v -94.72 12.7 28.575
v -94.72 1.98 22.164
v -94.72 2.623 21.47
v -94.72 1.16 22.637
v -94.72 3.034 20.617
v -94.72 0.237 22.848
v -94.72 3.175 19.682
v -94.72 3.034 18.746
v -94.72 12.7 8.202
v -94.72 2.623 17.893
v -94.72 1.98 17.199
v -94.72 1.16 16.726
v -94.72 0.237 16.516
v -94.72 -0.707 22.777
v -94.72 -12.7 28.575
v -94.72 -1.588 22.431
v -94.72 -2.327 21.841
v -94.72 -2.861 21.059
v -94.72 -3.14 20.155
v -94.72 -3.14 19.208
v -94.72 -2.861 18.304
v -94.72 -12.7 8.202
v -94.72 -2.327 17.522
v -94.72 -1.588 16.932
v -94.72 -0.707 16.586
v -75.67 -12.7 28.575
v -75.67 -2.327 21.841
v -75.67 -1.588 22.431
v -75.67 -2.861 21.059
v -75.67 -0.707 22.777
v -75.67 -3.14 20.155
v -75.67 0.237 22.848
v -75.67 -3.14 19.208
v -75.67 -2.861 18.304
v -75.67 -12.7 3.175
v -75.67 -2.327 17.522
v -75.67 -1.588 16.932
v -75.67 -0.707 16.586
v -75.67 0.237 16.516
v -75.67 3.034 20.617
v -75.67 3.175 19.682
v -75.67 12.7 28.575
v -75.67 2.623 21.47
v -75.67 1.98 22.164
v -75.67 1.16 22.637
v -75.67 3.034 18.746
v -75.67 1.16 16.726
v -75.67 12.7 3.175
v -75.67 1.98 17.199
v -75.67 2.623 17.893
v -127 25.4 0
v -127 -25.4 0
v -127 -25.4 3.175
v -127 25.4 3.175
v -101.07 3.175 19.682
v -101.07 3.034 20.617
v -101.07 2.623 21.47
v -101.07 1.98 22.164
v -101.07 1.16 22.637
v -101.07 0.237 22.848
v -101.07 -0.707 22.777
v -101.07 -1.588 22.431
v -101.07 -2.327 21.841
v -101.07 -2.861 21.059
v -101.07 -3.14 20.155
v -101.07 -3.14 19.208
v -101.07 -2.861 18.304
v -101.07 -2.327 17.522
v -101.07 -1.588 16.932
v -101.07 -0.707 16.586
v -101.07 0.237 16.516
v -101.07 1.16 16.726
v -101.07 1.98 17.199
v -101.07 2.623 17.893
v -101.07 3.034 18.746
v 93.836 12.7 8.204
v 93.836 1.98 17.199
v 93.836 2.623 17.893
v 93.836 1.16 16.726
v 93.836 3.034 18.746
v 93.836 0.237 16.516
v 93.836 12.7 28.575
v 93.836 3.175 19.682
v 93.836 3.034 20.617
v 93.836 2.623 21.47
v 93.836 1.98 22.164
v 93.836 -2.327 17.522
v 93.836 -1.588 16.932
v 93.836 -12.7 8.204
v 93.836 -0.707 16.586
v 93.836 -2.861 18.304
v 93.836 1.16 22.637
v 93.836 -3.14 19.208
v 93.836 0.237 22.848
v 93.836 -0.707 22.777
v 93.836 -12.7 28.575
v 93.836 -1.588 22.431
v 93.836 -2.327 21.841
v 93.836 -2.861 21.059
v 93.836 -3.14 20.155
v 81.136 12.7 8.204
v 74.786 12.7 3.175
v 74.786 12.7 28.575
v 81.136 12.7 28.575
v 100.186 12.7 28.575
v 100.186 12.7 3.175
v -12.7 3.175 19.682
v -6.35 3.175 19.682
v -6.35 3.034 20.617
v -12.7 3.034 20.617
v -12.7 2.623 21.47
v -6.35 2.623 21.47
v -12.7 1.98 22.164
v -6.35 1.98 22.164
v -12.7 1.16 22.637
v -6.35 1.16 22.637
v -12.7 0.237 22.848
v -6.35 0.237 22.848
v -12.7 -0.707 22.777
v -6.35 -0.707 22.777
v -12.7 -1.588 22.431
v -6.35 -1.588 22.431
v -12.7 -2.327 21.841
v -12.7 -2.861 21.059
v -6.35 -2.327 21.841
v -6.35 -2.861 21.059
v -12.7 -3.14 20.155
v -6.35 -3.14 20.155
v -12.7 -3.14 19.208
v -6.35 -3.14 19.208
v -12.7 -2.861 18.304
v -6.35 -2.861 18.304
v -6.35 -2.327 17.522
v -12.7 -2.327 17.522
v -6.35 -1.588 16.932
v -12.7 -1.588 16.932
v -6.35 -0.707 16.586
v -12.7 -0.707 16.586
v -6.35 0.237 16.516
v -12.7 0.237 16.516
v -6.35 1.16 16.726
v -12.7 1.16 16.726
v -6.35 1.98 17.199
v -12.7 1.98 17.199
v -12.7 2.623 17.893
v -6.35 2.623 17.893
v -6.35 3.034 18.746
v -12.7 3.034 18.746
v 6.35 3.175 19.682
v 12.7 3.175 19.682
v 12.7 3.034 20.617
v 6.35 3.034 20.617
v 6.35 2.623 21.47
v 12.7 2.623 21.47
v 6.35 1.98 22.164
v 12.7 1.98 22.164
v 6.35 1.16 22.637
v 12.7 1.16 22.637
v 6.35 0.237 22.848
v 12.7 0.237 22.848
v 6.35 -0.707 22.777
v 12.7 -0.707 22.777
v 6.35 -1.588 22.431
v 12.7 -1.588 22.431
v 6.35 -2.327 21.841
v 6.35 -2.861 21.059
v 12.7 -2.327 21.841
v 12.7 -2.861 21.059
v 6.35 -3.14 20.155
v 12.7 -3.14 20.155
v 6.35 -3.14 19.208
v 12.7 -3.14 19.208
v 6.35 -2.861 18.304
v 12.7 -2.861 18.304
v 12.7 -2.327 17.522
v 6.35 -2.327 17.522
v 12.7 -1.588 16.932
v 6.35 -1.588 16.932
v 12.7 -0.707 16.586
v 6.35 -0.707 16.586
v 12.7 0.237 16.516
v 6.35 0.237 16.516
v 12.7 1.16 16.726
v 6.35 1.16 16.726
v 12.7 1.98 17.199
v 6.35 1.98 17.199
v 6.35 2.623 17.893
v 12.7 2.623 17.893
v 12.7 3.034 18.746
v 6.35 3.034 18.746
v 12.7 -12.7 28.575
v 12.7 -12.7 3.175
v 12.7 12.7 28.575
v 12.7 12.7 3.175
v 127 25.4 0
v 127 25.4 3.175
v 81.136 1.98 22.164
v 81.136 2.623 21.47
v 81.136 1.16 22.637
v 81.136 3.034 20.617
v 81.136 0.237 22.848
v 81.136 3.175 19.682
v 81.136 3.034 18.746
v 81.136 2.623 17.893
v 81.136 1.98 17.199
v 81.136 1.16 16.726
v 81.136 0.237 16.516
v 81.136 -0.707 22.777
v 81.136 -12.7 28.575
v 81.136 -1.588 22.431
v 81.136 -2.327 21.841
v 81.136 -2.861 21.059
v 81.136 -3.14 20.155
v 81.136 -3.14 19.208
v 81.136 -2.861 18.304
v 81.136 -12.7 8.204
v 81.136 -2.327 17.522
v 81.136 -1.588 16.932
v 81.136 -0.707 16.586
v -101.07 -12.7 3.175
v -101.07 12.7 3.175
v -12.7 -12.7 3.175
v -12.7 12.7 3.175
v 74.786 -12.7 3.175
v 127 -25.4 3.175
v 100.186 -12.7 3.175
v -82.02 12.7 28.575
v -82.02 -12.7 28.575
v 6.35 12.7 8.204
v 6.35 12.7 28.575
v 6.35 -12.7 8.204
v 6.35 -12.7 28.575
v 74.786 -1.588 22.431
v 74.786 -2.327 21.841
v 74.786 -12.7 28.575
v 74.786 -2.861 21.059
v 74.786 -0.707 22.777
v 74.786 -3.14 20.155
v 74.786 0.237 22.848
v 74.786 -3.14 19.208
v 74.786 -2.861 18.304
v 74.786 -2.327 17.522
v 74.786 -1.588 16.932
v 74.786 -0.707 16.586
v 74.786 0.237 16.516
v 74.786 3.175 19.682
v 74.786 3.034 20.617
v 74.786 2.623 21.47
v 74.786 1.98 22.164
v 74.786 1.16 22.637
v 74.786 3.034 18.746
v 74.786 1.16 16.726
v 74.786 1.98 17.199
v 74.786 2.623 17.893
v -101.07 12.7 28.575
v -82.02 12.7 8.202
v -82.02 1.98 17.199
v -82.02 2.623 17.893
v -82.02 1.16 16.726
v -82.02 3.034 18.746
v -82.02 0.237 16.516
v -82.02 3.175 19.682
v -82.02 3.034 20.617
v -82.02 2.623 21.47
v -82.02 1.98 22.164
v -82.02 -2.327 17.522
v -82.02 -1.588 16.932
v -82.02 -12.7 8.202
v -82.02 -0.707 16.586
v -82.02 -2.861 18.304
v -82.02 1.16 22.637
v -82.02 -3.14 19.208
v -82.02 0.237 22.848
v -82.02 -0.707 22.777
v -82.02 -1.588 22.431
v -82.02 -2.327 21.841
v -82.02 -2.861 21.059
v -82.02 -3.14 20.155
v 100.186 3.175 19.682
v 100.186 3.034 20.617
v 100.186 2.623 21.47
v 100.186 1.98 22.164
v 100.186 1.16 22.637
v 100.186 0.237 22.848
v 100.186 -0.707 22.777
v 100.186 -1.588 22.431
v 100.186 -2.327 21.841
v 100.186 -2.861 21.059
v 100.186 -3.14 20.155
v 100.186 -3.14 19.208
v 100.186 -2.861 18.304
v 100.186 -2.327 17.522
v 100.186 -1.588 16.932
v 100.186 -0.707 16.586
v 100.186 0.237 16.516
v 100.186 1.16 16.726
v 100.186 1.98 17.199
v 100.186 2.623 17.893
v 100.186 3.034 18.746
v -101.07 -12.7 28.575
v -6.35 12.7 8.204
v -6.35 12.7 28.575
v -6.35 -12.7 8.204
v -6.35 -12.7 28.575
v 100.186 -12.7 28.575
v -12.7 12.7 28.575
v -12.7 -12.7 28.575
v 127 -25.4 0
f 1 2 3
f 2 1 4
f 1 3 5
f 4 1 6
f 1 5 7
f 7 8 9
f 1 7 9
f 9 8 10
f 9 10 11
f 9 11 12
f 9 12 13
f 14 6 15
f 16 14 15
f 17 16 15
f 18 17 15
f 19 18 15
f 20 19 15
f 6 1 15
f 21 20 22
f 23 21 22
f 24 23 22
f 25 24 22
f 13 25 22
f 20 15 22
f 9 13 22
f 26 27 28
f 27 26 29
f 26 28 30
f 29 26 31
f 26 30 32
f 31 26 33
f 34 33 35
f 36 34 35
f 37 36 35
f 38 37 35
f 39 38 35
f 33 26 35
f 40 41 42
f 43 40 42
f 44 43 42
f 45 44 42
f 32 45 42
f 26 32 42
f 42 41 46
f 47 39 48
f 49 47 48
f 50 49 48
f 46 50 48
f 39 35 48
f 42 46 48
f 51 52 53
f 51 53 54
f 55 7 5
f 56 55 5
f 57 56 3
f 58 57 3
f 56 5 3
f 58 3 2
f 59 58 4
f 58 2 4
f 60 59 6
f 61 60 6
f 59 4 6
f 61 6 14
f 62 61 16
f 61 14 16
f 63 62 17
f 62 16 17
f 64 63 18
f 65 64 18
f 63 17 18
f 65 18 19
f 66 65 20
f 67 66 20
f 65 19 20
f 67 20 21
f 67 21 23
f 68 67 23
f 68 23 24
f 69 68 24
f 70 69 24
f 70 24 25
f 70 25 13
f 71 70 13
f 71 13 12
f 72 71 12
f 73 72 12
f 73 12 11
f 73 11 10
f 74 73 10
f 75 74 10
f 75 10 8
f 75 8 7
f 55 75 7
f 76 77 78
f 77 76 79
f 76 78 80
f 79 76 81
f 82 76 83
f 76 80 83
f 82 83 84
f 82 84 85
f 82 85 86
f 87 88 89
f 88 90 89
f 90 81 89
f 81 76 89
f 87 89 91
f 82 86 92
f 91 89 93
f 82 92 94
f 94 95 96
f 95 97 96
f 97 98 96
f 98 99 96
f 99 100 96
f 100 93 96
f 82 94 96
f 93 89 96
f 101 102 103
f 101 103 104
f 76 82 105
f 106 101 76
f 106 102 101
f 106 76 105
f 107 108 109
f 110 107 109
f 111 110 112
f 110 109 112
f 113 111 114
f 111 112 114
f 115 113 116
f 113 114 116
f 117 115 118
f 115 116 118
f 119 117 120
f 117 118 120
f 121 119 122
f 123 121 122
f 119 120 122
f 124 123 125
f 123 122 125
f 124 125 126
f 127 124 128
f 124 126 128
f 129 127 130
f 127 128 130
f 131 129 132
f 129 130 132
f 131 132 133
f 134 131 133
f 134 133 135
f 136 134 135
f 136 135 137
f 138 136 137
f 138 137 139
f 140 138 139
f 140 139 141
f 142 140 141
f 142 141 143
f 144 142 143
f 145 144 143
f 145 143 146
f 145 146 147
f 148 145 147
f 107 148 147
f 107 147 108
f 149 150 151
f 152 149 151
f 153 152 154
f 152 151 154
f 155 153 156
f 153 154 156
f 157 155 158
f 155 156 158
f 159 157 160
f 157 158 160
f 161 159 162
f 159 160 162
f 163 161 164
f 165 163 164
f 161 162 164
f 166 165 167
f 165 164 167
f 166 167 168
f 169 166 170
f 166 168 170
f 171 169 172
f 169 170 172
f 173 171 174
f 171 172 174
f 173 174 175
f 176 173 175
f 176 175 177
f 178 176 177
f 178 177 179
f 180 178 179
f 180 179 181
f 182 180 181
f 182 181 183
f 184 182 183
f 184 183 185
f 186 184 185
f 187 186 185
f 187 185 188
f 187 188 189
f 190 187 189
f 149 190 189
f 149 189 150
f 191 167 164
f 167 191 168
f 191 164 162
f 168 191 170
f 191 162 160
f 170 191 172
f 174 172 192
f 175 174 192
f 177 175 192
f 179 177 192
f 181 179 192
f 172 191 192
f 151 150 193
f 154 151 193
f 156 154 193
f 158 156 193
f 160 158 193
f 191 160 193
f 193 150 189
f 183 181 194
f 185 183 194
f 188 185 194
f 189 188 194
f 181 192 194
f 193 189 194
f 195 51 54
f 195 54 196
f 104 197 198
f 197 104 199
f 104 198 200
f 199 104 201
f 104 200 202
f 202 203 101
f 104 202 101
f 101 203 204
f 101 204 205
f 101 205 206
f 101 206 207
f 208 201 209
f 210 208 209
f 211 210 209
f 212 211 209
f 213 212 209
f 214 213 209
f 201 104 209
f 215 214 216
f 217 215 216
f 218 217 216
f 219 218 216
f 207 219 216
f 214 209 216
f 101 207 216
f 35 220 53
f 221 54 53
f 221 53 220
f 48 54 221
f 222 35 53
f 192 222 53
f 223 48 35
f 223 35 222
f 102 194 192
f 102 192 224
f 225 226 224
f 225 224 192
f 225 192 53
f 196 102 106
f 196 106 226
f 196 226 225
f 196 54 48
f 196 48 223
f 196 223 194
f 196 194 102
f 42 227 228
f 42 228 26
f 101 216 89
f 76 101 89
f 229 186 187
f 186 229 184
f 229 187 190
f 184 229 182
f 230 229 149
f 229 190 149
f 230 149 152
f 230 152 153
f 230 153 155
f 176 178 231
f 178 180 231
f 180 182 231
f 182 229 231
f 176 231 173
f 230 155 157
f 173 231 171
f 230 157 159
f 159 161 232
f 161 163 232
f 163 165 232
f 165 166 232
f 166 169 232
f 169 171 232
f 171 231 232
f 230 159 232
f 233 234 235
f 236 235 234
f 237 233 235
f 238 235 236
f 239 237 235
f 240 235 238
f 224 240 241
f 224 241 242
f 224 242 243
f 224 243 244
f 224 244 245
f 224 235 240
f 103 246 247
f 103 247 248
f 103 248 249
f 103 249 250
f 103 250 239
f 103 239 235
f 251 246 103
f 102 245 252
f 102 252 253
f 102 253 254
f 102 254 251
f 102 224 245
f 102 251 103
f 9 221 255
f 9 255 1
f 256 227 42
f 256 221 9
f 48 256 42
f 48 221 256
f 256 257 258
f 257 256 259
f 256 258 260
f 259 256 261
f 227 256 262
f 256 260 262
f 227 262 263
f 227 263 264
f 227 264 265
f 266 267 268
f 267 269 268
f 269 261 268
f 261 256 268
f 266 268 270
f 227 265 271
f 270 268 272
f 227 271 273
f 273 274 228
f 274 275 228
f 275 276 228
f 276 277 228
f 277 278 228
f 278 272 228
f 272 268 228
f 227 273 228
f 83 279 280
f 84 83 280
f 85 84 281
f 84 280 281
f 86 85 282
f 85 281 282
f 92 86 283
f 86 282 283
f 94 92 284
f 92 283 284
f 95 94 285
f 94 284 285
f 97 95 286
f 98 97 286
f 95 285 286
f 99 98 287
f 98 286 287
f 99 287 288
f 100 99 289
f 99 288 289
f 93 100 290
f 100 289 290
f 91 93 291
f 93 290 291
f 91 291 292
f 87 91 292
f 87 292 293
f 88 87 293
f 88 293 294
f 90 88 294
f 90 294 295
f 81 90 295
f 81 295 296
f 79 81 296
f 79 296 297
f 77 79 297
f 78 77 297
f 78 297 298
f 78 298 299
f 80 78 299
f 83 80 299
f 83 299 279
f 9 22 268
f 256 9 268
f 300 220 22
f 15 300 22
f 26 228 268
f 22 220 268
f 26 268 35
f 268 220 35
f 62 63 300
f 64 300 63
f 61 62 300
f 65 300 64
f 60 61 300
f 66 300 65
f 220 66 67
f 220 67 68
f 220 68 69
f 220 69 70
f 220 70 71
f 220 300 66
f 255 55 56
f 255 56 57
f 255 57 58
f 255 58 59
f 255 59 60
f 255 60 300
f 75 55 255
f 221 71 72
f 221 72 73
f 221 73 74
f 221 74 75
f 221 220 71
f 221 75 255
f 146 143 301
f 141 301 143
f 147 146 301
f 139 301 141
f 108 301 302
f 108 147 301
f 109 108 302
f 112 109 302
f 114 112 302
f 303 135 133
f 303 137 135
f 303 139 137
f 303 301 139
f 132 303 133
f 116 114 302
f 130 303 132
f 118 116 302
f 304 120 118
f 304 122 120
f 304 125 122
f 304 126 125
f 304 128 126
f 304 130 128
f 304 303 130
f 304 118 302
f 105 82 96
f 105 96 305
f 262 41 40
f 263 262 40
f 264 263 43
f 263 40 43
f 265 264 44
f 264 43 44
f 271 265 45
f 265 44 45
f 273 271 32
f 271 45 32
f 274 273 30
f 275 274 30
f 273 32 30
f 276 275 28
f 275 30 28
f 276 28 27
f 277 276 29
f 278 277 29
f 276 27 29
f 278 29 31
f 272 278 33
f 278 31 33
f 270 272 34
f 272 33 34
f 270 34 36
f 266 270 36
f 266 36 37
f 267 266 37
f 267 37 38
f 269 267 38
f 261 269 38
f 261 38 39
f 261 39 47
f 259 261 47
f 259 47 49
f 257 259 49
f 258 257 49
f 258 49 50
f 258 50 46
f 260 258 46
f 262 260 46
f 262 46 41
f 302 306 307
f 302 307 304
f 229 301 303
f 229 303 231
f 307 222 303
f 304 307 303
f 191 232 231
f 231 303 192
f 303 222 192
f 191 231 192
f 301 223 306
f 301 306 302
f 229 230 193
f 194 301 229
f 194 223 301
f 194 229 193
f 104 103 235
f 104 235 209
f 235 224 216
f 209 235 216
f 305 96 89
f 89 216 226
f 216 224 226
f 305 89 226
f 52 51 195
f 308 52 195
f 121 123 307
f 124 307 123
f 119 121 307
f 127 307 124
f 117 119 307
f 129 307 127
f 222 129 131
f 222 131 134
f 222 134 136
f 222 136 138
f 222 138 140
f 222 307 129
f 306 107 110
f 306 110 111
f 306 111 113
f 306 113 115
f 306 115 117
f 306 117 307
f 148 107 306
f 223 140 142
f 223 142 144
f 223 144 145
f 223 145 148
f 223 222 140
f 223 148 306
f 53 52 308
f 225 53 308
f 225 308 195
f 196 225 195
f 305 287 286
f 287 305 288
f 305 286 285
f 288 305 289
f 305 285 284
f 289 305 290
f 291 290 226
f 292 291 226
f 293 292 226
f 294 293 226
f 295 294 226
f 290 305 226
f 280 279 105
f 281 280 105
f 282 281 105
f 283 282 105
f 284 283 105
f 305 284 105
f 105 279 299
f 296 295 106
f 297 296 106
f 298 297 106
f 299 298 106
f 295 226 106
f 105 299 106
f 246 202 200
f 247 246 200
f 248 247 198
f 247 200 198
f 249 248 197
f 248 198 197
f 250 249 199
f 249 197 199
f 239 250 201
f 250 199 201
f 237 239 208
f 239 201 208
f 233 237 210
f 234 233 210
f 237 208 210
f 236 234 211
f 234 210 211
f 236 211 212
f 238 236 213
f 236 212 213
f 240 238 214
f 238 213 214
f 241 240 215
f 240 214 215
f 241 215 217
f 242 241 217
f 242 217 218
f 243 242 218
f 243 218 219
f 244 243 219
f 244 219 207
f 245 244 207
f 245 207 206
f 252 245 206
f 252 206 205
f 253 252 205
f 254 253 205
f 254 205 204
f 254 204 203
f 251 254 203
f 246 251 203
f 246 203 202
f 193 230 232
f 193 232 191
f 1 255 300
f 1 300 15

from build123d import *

# Parameters (mm, degrees)
F0_W     = 254
F0_H     = 50.8
F1_DEPTH = 3.175
F2_W     = 25.4
F2_H     = 25.4
F3_DEPTH = 25.4
F4_W     = 12.7
F4_H     = 20.3732
F4_H_2   = 40.7416
F5_W     = 12.7
F5_H     = 20.3708
F6_DEPTH = 38.1
F7_R     = 3.175
F8_DEPTH = 227.187036


with BuildPart() as f1:
    # F0 (on Top) → F1 (new body)
    with BuildSketch(Plane.XY):
        Rectangle(F0_W, F0_H)
    extrude(amount=F1_DEPTH)

    # F2 (on face) → F3 (join)
    with BuildSketch(Plane.XY.offset(3.175)):
        with Locations((-88.369727, 0)):
            Rectangle(F2_W, F2_H)
        Rectangle(F2_W, F2_H)
        with Locations((87.486036, 0)):
            Rectangle(F2_W, F2_H)
    extrude(amount=F3_DEPTH)

    # F4 (on face) + F5 (on face) → F6 (cut)
    with BuildSketch(Plane.XZ.offset(12.7)):
        with Locations((-88.369727, 38.7616)):
            Rectangle(F4_W, F4_H)
        with Locations((-88.369727, 18.3884)):
            Rectangle(F4_W, F4_H)
        with Locations((0, 28.575)):
            Rectangle(F4_W, F4_H_2)
    with BuildSketch(Plane.XZ.offset(12.7)):
        with Locations((87.486036, 38.7604)):
            Rectangle(F5_W, F5_H)
        with Locations((87.486036, 18.3896)):
            Rectangle(F5_W, F5_H)
    extrude(amount=-F6_DEPTH, mode=Mode.SUBTRACT)

    # F7 (on face) → F8 (cut, through all)
    with BuildSketch(Plane.YZ.offset(100.186036)):
        with Locations((0, 19.681644)):
            Circle(F7_R)
    extrude(amount=-F8_DEPTH, mode=Mode.SUBTRACT)


solid = f1.part
